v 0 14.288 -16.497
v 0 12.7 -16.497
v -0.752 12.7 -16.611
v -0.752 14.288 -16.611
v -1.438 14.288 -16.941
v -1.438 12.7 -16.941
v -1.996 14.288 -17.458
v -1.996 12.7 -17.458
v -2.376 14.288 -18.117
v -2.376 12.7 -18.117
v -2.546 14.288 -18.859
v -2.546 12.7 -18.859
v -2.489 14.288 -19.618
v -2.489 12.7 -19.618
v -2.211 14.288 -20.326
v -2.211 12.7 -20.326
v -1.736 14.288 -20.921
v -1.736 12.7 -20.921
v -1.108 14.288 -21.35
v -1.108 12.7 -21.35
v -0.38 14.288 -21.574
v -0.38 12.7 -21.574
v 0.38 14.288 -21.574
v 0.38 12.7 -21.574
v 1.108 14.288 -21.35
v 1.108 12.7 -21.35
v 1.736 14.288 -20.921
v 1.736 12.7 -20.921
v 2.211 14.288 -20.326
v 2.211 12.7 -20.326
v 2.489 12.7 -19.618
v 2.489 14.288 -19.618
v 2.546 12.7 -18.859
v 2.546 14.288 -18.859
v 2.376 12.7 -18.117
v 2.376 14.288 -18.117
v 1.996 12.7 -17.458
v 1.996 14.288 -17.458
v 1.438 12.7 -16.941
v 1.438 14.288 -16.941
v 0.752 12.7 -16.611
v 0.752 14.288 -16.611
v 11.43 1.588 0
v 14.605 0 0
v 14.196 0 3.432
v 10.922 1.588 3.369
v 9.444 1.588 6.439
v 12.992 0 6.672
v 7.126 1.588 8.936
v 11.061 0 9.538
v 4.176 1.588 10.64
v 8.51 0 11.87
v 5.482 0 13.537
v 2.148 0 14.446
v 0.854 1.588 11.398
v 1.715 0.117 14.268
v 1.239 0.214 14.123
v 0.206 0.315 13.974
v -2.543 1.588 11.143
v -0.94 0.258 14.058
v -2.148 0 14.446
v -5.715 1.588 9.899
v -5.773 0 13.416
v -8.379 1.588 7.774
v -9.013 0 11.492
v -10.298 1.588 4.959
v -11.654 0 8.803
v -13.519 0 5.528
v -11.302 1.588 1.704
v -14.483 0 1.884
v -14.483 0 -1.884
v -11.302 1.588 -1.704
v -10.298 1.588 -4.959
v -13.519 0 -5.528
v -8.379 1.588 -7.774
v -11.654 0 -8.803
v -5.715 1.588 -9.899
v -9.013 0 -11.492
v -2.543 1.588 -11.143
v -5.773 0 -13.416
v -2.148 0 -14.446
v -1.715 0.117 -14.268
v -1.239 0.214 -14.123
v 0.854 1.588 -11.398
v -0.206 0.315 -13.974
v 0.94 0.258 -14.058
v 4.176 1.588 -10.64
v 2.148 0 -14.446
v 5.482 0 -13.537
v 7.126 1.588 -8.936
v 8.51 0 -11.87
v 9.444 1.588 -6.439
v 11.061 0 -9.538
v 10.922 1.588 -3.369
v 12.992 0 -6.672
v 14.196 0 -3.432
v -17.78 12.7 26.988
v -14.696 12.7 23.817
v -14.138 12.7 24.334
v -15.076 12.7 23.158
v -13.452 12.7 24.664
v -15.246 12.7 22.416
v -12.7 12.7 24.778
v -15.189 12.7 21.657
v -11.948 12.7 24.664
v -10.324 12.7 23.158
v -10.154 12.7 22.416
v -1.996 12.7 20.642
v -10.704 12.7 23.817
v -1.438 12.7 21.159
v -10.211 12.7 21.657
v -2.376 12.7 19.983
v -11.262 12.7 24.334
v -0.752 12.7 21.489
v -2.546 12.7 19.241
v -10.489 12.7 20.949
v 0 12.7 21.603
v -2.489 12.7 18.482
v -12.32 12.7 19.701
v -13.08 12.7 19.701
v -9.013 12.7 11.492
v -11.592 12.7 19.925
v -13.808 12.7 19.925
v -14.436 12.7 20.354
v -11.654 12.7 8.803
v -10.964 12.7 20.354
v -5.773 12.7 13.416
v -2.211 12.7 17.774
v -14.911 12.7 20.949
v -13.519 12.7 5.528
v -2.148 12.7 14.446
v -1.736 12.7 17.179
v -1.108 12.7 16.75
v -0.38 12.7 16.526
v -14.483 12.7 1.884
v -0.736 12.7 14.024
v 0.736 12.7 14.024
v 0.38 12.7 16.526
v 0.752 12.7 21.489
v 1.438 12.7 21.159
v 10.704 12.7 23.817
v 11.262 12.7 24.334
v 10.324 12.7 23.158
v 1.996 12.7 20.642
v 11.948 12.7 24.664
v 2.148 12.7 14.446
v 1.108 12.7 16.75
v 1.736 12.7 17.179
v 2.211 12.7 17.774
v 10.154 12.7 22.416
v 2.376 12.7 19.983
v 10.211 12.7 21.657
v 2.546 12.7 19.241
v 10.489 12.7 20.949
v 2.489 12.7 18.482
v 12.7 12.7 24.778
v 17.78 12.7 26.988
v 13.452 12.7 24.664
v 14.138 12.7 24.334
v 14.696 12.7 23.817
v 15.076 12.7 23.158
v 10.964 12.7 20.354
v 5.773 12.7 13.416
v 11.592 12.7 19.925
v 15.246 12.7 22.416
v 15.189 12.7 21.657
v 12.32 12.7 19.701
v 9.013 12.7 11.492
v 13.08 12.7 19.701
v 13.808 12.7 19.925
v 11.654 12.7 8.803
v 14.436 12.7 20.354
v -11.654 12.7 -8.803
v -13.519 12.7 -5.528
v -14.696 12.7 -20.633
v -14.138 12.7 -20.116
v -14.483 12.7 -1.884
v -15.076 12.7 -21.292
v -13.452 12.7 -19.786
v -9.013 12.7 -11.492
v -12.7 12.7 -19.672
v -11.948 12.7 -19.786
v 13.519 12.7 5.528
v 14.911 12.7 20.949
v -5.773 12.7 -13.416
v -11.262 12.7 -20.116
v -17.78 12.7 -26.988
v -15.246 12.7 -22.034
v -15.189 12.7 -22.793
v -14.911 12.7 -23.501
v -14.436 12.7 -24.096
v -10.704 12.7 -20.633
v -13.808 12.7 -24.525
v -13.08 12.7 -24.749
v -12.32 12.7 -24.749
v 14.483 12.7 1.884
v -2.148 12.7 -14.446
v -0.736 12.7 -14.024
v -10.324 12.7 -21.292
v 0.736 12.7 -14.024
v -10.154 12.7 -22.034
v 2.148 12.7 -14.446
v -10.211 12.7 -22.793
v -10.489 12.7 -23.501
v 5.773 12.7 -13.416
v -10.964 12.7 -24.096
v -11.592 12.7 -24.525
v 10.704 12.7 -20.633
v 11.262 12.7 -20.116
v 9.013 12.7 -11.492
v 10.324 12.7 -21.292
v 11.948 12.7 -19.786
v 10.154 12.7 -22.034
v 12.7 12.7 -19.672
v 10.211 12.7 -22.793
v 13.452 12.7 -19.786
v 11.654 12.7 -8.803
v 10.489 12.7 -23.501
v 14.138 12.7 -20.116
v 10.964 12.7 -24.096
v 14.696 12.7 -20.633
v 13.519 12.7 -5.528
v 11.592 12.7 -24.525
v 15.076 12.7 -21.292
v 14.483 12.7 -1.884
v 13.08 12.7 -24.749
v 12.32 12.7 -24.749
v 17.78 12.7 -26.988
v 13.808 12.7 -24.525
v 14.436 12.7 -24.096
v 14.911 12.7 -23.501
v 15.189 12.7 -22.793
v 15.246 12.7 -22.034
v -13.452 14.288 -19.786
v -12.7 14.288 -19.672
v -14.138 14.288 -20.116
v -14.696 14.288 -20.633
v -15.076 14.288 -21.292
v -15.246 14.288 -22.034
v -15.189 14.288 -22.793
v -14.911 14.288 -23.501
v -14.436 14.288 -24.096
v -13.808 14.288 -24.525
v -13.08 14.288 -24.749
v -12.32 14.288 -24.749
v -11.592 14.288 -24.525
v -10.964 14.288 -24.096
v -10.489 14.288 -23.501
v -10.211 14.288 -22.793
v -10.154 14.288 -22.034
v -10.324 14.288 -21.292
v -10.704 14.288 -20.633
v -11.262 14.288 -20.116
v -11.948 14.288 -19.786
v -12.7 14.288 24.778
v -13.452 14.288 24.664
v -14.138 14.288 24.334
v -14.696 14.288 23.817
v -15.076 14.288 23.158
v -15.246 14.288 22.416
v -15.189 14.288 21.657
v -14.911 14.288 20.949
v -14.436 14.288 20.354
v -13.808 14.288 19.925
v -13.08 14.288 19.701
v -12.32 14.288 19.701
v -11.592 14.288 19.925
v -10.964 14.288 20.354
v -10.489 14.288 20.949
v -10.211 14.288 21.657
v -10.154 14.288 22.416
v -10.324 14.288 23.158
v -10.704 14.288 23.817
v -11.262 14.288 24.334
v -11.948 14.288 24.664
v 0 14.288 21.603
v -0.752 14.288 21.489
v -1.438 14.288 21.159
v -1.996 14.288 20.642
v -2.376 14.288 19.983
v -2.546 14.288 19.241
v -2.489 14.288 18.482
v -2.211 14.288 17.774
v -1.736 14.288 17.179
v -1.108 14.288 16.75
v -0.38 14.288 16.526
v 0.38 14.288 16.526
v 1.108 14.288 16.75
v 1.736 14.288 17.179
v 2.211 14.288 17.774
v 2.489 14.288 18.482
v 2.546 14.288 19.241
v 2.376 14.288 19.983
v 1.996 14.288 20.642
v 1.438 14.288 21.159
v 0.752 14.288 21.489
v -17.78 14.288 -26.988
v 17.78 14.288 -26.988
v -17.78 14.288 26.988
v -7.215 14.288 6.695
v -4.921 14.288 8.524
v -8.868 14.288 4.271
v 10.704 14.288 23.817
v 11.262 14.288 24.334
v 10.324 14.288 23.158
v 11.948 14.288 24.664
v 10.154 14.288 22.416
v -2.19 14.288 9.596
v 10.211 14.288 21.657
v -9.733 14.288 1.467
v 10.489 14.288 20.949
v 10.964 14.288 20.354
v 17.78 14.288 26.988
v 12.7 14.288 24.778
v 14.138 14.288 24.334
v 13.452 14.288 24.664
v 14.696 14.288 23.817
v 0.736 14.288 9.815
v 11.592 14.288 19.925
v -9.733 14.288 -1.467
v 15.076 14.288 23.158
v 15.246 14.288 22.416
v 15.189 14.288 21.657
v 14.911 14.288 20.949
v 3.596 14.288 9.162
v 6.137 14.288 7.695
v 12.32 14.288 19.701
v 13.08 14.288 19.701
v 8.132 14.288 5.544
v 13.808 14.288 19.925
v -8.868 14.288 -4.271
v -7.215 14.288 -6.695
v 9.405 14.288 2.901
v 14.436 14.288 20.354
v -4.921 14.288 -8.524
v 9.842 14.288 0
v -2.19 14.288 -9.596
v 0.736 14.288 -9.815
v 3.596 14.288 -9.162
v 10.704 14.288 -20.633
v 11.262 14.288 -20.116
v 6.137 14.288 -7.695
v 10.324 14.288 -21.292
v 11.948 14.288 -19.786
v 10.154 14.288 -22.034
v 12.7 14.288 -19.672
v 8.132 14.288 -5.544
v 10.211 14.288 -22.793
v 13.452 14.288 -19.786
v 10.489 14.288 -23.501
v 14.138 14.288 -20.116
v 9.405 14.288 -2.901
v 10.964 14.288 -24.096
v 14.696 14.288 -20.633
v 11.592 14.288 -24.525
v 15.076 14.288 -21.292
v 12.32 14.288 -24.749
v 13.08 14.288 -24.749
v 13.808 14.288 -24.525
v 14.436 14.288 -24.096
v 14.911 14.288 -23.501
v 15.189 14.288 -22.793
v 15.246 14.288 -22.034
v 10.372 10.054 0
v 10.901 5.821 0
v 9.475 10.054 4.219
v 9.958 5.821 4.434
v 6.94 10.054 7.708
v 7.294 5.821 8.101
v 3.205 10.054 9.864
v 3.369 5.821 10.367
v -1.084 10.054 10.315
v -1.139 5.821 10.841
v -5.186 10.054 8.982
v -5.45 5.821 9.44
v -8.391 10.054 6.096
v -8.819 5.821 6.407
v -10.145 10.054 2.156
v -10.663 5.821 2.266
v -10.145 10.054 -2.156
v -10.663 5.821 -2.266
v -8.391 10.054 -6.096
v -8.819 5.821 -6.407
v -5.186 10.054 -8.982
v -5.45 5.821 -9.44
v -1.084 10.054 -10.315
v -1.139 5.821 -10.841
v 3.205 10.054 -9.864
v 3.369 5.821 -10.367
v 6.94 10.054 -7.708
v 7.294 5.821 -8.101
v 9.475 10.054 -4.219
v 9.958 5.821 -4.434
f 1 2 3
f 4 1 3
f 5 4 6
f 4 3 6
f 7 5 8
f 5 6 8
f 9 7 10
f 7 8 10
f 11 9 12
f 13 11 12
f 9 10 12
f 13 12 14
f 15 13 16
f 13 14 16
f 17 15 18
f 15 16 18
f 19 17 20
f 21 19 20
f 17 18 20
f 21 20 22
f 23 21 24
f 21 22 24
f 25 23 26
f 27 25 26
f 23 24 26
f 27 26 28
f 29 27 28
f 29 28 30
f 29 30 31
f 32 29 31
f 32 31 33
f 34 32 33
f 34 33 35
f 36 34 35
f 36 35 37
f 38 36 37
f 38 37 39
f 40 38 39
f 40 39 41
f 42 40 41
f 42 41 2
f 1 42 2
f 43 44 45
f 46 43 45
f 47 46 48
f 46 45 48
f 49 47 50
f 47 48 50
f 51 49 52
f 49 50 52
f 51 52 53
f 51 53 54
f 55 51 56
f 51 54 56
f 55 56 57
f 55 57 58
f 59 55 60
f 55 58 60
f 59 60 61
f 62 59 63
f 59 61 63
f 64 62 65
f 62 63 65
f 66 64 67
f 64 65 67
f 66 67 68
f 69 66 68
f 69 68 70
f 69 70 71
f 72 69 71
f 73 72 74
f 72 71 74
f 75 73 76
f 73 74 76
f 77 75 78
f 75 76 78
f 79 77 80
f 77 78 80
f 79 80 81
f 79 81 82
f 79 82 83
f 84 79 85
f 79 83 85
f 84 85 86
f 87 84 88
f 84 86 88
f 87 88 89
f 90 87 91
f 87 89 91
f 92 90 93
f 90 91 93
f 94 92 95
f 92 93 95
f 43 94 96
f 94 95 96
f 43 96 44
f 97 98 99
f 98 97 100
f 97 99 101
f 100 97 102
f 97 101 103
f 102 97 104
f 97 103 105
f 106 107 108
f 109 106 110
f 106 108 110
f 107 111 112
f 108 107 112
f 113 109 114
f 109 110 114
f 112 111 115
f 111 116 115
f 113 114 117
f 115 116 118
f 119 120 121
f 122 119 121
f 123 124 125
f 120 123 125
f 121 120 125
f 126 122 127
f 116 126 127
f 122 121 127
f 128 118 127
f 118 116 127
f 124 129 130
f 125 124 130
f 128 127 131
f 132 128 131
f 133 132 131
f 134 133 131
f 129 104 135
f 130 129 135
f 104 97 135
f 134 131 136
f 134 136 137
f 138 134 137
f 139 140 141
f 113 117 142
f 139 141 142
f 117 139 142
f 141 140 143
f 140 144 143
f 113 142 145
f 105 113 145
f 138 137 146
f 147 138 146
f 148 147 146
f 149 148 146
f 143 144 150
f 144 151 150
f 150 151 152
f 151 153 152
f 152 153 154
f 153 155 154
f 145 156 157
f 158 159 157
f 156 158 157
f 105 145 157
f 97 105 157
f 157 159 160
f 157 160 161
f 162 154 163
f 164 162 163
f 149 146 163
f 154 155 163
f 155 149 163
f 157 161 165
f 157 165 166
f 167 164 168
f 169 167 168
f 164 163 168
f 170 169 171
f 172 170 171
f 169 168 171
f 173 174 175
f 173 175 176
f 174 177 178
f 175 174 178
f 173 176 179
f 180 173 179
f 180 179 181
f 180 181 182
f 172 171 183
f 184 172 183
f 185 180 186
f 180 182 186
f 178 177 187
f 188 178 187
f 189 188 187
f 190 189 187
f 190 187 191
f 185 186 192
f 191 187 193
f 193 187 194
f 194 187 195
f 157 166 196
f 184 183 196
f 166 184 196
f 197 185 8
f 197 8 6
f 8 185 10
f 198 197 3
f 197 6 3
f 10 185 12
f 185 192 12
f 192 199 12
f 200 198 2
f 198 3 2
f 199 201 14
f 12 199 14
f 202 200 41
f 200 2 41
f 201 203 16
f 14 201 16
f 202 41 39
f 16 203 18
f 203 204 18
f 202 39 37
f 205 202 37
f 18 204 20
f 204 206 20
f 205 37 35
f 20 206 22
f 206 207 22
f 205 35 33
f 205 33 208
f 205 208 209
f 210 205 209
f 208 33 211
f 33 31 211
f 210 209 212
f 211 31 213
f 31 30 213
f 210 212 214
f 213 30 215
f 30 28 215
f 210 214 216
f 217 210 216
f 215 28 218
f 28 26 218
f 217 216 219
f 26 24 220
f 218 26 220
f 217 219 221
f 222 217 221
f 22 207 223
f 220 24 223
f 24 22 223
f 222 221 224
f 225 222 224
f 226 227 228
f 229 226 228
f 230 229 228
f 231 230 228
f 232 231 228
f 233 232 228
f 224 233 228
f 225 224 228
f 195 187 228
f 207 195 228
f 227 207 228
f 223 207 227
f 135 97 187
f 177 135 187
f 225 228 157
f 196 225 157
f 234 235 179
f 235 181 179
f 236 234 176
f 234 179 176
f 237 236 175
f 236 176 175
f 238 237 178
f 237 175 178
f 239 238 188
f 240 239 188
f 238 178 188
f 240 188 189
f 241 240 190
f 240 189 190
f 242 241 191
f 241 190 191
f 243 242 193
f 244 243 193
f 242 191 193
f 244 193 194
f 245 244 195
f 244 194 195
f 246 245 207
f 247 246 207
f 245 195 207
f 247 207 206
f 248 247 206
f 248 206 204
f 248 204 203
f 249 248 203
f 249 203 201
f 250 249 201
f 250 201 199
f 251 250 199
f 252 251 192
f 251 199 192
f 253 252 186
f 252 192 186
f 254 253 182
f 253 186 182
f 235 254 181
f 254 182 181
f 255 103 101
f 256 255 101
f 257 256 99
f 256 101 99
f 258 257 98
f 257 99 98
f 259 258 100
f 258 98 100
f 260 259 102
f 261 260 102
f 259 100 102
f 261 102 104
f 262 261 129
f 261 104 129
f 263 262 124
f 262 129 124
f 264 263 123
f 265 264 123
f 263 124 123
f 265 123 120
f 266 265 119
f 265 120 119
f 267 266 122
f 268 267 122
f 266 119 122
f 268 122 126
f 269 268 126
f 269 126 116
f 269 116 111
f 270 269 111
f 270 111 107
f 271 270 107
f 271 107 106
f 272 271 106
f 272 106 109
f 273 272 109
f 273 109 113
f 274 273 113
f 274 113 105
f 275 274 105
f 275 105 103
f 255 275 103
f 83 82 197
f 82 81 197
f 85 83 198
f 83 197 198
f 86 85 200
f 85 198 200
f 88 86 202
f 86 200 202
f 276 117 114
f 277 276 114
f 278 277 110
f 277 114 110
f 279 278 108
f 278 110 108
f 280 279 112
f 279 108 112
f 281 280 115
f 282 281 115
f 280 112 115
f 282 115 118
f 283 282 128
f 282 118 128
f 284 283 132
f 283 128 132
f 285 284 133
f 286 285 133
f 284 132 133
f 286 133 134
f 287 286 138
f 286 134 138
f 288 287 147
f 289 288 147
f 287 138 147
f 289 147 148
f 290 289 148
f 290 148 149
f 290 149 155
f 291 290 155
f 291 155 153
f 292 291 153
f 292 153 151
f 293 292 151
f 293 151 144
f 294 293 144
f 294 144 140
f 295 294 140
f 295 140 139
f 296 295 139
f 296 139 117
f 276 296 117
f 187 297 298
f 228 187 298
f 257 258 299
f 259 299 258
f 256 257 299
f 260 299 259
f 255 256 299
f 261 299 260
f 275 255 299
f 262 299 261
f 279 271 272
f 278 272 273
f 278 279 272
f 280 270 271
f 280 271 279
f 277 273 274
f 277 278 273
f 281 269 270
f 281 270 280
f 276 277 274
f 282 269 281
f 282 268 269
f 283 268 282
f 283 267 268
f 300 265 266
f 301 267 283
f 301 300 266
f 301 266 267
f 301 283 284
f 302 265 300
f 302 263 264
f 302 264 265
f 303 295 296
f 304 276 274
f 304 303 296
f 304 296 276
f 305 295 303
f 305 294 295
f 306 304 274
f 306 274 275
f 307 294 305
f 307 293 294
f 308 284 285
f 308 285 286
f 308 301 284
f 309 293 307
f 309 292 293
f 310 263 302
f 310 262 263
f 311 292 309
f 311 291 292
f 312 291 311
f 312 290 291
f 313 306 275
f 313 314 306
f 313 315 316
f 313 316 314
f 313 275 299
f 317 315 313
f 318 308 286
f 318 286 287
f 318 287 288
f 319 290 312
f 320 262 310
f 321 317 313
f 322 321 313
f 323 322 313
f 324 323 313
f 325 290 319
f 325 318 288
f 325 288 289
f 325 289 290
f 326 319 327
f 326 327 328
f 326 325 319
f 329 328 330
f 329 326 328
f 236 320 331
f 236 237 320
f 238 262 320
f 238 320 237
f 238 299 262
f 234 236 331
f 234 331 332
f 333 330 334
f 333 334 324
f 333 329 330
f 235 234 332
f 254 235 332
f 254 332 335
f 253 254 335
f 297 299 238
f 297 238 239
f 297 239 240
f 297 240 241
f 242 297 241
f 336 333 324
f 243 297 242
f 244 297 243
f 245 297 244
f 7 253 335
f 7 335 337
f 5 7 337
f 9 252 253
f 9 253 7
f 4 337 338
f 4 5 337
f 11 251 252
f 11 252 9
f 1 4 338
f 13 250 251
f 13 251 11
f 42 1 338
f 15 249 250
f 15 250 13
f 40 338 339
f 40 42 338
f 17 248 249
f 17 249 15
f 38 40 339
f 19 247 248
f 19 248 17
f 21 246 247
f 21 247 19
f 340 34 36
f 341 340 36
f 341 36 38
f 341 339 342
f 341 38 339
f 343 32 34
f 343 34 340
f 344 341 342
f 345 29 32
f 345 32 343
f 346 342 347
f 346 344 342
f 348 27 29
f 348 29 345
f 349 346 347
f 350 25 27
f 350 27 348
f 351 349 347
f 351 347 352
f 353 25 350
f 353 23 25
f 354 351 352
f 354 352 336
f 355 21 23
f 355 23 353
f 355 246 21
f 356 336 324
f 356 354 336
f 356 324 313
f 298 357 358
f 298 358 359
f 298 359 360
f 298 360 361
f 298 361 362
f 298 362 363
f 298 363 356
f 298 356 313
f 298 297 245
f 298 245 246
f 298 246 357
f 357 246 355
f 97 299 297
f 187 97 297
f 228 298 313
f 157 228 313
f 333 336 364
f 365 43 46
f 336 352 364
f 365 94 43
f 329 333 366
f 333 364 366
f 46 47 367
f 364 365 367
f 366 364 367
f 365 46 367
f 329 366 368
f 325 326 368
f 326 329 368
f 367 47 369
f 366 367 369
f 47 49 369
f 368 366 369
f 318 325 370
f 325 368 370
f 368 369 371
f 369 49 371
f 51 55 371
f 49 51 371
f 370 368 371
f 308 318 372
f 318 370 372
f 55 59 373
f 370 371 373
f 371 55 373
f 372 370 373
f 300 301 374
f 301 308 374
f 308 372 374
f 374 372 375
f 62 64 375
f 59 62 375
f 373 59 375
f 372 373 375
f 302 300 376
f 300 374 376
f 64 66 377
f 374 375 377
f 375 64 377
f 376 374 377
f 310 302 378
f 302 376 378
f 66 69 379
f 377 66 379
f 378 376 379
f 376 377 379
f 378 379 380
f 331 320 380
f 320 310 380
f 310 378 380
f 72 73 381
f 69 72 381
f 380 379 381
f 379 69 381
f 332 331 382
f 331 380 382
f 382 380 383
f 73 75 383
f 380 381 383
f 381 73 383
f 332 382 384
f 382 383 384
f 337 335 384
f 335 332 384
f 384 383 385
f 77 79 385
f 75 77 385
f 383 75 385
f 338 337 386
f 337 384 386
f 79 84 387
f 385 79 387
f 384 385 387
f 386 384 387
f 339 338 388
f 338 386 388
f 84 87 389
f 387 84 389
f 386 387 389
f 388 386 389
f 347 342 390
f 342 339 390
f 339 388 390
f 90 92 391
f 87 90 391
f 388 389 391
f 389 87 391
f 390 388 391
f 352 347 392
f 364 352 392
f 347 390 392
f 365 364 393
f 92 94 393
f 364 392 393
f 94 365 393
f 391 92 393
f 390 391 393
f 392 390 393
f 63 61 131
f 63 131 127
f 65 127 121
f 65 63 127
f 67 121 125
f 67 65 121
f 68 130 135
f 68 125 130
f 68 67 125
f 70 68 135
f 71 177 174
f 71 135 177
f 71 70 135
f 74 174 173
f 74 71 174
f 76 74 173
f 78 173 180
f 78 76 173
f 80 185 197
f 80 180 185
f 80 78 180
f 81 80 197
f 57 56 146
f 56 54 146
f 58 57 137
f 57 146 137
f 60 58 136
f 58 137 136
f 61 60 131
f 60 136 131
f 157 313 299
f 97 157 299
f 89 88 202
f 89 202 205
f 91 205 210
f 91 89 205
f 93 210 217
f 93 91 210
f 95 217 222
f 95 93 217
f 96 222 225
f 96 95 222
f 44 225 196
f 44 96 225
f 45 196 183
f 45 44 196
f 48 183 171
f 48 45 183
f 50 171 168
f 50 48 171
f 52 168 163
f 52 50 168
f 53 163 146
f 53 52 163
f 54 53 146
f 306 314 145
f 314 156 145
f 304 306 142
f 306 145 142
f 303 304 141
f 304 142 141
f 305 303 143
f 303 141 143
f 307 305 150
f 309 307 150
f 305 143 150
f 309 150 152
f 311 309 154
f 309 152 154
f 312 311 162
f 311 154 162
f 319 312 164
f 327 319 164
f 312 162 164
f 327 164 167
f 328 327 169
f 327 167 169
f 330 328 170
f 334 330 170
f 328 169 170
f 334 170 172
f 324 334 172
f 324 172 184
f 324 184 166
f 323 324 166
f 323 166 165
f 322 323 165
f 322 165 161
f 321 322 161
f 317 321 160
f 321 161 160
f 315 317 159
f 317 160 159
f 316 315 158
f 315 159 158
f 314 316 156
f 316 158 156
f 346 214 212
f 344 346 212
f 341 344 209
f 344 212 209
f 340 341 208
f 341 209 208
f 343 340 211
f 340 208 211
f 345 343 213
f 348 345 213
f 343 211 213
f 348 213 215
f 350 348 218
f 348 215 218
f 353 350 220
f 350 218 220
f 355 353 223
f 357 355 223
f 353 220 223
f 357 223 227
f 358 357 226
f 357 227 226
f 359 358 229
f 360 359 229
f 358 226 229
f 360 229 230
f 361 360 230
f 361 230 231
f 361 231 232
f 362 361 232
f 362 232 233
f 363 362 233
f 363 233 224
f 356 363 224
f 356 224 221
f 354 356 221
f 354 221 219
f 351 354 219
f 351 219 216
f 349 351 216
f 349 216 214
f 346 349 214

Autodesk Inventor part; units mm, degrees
ref_plane "YZ Plane" through (0, 0, 0) normal (1, 0, 0) x (0, 1, 0)
ref_plane "XZ Plane" through (0, 0, 0) normal (0, 1, 0) x (-1, 0, 0)
ref_plane "XY Plane" through (0, 0, 0) normal (0, 0, 1) x (1, 0, 0)
sketch "Sketch1" plane through (0, 0, 0) normal (0, 0, 1) x (1, 0, 0)
  line L0 (0, 0) -> (0, 14.2875)
  line L1 (0, 14.2875) -> (9.8425, 14.2875) construction
  line L2 (9.8425, 14.2875) -> (14.605, 14.2875)
  line L3 (14.605, 14.2875) -> (14.605, 0)
  line L4 (14.605, 0) -> (11.43, 1.5875)
  line L5 (11.43, 1.5875) -> (9.8425, 14.2875)
  dimension "d1" = 19.685
  dimension "d2" = 1.5875
  dimension "d3" = 3.175
  dimension "d5" = 14.2875
  dimension "d6" = 12.7
revolve "Revolution1" add sketch "Sketch1" angle 360 about axis through (0, 0, 0) along (0, 1, 0)
sketch "Sketch2" plane through (0, 14.2875, 0) normal (0, 1, 0) x (1, 0, 0)
  line L0 (17.78, -26.9875) -> (-17.78, -26.9875)
  line L1 (-17.78, -26.9875) -> (-17.78, 26.9875)
  line L2 (-17.78, 26.9875) -> (17.78, 26.9875)
  line L3 (17.78, 26.9875) -> (17.78, -26.9875)
  line L4 (17.78, -26.9875) -> (-17.78, 26.9875) construction
  line L5 (-17.78, -26.9875) -> (17.78, 26.9875) construction
  circle A0 centre (0, 0) radius 14.605 projected
  point P0 (0, -14.605)
  point P1 (-14.605, 0)
  dimension "d9" = 3.175
  dimension "d22" = 53.975
extrude "Extrusion1" add sketch "Sketch2" against normal blind 1.5875
sketch "Sketch3" plane through (-17.78, 14.2875, -26.9875) normal (0, 1, 0) x (1, 0, 0)
  line L0 (17.78, -46.0375) -> (17.78, -7.9375) construction
  line L1 (5.08, -49.2125) -> (30.48, -49.2125)
  line L2 (30.48, -49.2125) -> (30.48, -4.7625)
  line L3 (30.48, -4.7625) -> (5.08, -4.7625)
  line L4 (5.08, -4.7625) -> (5.08, -49.2125)
  line L5 (5.08, -49.2125) -> (30.48, -4.7625) construction
  line L6 (30.48, -49.2125) -> (5.08, -4.7625) construction
  point P0 (17.78, -26.9875)
  point P1 (17.78, -26.9875)
  dimension "d12" = 38.1
  dimension "d20" = 44.45
  dimension "d21" = 25.4
hole "Hole1" at (12.7, 14.2875, 22.225) at (12.7, 14.2875, -22.225) at (-12.7, 14.2875, -22.225) at (-12.7, 14.2875, 22.225) at (0, 14.2875, -19.05) at (0, 14.2875, 19.05) direction (0, -1, 0) diameter 5.1054 end through all clearance for "Flat Head Machine Screw (82)" size "#10" standard "Ansi Unified Screw Threads"
sketch "Sketch4" plane through (0, 12.7, 0) normal (0, -1, 0) x (1, 0, 0)
  circle A0 centre (0, 19.05) radius 2.5527 projected
  circle A1 centre (0, 19.05) radius 5.08
  circle A2 centre (0, -19.05) radius 2.5527 projected
  circle A3 centre (0, -19.05) radius 5.08
  point P0 (0, 0)
  dimension "d23" = 10.16
extrude "Extrusion2" cut sketch "Sketch4" along normal up to surface
properties part number "Gripper_3DPrint"
